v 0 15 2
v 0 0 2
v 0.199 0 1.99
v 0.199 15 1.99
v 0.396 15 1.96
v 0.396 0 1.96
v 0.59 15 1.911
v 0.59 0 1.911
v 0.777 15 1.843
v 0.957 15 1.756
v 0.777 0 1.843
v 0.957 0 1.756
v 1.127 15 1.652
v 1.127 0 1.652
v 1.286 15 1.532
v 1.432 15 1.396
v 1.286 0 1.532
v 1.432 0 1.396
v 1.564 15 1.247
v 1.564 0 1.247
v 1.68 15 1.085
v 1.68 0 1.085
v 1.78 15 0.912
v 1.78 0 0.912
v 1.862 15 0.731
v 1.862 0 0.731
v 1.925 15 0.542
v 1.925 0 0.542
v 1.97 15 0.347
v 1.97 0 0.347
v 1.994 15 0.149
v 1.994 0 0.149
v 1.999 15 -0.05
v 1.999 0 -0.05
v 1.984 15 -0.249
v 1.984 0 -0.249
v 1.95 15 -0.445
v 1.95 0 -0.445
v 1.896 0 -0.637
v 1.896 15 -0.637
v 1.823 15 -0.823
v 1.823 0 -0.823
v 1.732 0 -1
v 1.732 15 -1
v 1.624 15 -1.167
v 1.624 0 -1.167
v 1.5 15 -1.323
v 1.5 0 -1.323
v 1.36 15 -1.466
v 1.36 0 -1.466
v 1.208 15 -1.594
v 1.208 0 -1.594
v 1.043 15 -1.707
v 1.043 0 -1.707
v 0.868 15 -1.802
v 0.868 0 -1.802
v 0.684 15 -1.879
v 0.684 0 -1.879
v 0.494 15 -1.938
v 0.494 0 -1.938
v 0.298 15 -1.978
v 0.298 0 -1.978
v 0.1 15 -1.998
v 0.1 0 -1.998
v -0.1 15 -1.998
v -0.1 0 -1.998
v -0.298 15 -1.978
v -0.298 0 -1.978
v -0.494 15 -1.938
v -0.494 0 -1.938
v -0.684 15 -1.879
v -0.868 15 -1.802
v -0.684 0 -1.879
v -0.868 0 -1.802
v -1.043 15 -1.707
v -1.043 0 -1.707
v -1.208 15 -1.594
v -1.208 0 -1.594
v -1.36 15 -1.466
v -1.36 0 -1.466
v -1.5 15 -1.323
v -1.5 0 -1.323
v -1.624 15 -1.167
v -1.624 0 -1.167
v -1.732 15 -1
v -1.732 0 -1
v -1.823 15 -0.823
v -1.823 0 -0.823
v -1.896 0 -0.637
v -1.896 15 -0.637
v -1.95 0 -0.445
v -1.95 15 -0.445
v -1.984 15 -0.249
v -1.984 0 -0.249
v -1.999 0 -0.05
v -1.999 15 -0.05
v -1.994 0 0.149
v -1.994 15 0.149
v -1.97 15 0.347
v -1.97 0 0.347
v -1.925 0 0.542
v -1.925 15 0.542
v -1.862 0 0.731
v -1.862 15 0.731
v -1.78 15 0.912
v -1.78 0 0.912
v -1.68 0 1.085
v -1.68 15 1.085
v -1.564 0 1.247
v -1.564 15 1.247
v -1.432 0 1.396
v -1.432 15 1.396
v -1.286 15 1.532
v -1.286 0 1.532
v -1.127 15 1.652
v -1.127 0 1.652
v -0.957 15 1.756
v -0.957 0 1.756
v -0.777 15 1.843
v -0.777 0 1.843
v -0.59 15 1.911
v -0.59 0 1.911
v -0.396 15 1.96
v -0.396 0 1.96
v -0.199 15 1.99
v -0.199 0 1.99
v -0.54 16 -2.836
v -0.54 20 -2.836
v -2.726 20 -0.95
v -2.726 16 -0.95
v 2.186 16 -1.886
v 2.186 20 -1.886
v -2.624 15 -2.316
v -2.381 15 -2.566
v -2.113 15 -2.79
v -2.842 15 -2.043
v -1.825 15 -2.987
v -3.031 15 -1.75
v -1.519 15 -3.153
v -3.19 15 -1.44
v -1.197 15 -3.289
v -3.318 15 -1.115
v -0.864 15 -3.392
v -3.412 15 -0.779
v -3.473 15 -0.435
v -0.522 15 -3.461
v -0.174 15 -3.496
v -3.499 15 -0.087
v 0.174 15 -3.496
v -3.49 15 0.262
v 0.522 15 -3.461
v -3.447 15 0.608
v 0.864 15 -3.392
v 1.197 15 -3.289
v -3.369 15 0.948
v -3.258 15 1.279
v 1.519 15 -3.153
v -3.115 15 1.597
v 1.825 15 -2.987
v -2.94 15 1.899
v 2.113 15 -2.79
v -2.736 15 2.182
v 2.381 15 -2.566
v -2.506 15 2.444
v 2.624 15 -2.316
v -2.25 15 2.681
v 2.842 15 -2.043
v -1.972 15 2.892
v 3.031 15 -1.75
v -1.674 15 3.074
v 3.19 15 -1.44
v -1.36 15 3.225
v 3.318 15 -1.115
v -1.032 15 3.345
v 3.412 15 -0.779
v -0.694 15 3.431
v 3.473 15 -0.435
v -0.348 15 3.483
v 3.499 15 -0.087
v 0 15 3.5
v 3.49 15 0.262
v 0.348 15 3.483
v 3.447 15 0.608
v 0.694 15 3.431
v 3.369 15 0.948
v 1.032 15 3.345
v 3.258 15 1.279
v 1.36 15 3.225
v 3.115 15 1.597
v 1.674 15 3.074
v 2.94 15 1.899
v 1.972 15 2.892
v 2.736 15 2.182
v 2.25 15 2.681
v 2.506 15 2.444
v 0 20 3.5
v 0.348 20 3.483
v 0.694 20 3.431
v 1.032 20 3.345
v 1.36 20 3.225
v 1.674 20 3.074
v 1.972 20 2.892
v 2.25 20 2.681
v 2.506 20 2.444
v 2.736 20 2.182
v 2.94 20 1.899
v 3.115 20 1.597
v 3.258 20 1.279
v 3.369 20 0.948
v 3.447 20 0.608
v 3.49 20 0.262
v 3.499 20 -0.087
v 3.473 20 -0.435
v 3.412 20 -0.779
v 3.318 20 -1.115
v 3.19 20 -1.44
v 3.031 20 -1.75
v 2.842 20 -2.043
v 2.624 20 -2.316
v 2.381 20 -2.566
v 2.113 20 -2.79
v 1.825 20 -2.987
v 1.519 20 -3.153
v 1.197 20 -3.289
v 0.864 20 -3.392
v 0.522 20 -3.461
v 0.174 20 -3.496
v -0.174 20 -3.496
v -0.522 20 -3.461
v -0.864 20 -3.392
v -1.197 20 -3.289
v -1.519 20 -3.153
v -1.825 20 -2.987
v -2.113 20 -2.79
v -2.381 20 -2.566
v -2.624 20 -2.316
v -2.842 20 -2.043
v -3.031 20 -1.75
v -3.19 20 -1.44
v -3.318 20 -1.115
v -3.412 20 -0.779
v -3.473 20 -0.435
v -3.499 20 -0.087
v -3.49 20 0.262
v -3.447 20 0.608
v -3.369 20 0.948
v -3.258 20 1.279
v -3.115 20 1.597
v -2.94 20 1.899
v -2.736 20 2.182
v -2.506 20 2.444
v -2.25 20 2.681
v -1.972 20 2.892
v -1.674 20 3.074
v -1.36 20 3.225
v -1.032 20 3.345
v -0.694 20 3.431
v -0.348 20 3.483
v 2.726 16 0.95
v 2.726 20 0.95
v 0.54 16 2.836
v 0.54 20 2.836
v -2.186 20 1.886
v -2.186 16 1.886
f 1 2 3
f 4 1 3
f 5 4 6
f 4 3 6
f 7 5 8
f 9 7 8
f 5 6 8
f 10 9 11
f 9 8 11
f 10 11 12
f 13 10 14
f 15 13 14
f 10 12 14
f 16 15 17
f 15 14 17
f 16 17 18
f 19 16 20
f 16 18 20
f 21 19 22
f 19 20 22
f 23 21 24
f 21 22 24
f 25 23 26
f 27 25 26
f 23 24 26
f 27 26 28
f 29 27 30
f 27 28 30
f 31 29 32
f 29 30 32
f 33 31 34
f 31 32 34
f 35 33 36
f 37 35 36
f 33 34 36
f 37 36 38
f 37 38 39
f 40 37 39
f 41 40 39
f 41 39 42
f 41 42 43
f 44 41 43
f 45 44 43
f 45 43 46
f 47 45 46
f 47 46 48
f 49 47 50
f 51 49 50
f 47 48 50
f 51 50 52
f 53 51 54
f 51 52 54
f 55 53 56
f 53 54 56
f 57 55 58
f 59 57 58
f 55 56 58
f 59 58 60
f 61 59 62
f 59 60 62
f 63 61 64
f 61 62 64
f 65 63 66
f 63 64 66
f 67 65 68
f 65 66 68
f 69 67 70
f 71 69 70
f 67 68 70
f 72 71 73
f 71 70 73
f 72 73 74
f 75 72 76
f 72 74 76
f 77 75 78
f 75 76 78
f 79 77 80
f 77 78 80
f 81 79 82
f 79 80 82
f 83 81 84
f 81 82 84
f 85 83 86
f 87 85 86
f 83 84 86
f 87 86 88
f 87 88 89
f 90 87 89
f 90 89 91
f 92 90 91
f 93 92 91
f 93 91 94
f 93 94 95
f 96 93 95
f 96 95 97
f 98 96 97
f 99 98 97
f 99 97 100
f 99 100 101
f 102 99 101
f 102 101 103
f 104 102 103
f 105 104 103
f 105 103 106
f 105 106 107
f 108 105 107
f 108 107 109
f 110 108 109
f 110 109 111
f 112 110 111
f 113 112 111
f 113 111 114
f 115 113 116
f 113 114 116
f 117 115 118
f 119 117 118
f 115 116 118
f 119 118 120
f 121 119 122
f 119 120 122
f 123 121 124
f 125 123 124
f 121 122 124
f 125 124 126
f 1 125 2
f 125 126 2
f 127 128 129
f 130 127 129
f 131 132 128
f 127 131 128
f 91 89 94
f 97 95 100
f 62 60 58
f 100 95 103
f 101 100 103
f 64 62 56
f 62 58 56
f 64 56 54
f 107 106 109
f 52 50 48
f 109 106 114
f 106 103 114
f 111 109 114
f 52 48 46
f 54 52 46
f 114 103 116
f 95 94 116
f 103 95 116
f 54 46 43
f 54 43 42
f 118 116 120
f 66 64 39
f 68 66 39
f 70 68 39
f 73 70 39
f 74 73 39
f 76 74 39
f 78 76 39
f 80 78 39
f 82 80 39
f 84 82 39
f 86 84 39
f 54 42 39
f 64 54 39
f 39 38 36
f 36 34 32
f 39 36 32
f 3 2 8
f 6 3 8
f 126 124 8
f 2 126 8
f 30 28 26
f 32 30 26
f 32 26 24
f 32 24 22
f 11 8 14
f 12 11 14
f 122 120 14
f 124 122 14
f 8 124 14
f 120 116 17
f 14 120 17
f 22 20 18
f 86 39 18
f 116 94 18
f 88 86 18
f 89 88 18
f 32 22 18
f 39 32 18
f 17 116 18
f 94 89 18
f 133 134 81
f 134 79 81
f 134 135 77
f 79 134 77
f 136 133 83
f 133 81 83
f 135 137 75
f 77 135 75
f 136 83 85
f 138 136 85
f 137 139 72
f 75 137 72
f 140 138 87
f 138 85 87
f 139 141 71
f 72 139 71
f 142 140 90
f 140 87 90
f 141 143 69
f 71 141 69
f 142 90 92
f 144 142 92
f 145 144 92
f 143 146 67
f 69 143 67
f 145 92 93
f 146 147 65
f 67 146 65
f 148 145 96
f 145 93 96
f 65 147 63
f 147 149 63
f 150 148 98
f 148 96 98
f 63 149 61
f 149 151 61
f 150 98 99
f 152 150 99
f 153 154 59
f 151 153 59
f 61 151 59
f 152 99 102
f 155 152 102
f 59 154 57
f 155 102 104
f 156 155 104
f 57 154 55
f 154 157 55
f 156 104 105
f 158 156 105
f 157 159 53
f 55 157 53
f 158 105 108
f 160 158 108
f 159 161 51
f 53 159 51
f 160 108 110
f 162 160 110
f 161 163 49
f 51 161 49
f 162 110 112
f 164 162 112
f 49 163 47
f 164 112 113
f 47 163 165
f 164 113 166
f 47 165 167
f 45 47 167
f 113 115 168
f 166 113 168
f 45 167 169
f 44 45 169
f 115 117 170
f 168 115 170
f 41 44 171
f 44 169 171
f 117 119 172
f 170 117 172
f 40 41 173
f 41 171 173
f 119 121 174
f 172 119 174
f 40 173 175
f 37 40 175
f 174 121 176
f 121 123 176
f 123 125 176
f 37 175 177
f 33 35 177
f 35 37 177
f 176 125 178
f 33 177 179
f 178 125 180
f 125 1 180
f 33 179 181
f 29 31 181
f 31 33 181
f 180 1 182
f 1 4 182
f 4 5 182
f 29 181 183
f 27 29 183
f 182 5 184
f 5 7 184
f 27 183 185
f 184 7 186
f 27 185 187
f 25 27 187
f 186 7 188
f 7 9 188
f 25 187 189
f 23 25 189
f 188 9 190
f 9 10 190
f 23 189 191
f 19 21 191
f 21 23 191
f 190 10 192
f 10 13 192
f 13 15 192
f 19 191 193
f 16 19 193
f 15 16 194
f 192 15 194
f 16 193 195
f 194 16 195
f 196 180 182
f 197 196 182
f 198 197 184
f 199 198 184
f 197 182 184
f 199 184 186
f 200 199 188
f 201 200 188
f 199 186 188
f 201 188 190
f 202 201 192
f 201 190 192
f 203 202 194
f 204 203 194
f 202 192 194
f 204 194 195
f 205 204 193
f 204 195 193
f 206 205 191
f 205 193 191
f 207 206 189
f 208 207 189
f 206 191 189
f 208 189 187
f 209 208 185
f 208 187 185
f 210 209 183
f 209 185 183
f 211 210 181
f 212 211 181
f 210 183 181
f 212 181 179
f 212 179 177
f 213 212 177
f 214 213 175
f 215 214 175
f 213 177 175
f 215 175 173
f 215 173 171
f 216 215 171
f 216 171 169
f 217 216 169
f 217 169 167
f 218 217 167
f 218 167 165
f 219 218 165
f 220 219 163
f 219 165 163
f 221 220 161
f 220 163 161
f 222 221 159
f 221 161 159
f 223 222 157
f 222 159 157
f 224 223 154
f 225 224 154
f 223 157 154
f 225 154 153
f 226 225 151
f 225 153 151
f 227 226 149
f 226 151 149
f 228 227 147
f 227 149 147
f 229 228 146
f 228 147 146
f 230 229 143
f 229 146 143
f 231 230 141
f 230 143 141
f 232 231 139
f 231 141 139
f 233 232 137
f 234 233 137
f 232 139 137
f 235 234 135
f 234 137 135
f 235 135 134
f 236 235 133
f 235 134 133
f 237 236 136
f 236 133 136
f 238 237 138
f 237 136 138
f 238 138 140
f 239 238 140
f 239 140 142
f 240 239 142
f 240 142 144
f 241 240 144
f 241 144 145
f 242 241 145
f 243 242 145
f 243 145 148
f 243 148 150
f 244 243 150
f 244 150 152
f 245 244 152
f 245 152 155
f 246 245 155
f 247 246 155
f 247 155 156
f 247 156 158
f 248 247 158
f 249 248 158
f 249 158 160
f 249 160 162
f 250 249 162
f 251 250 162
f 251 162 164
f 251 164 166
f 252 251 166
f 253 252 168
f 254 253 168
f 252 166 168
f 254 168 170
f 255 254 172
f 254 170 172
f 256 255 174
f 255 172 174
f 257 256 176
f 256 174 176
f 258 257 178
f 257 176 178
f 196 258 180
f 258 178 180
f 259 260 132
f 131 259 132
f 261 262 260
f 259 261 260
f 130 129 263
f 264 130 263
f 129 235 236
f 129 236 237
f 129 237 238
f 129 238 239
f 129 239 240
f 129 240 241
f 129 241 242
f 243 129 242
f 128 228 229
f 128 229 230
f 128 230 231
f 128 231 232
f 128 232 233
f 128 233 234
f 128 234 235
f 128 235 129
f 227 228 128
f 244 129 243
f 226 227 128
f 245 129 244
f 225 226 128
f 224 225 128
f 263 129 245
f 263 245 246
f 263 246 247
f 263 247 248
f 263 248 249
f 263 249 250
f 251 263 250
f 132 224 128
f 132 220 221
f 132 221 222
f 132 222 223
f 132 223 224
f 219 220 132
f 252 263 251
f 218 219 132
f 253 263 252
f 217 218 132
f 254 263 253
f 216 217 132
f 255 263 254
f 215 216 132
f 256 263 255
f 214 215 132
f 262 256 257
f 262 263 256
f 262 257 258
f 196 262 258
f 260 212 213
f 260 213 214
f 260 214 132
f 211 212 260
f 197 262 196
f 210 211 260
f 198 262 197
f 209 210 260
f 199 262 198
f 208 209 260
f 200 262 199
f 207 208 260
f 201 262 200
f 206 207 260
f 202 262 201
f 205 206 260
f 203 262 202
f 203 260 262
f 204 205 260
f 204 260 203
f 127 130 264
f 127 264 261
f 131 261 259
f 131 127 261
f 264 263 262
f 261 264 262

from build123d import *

# Parameters (mm, degrees)
ESQUISSE1_R             = 2
BOSS_EXTRU_2_DEPTH      = 15
ESQUISSE4_R             = 3.5
BOSS_EXTRU_5_DEPTH      = 5
ENL_V_MAT_EXTRU_3_DEPTH = 4


with BuildPart() as part:
    # Esquisse1 → Boss.-Extru.2 (new body)
    with BuildSketch(Plane(origin=(0, 0, 0), x_dir=(1, 0, 0), z_dir=(0, 1, 0))):
        with Locations(Location((0, 0, 0), (0, 0, 270))):
            Circle(ESQUISSE1_R)
    extrude(amount=BOSS_EXTRU_2_DEPTH)

    # Esquisse4 → Boss.-Extru.5 (add)
    with BuildSketch(Plane(origin=(0, 15, 0), x_dir=(1, 0, 0), z_dir=(0, 1, 0))):
        with Locations(Location((0, 0, 0), (0, 0, 270))):
            Circle(ESQUISSE4_R)
    extrude(amount=BOSS_EXTRU_5_DEPTH)

    # Esquisse6 → Enlèv. mat.-Extru.3 (cut)
    with BuildSketch(Plane(origin=(0, 20, 0), x_dir=(1, 0, 0), z_dir=(0, 1, 0))):
        Polygon((0.539972864, -2.835800176), (2.725861425, -0.950269871), (2.185888561, 1.885530305), (-0.539972864, 2.835800176), (-2.725861425, 0.950269871), (-2.185888561, -1.885530305), align=None)
    extrude(amount=-ENL_V_MAT_EXTRU_3_DEPTH, mode=Mode.SUBTRACT)


solid = part.part
